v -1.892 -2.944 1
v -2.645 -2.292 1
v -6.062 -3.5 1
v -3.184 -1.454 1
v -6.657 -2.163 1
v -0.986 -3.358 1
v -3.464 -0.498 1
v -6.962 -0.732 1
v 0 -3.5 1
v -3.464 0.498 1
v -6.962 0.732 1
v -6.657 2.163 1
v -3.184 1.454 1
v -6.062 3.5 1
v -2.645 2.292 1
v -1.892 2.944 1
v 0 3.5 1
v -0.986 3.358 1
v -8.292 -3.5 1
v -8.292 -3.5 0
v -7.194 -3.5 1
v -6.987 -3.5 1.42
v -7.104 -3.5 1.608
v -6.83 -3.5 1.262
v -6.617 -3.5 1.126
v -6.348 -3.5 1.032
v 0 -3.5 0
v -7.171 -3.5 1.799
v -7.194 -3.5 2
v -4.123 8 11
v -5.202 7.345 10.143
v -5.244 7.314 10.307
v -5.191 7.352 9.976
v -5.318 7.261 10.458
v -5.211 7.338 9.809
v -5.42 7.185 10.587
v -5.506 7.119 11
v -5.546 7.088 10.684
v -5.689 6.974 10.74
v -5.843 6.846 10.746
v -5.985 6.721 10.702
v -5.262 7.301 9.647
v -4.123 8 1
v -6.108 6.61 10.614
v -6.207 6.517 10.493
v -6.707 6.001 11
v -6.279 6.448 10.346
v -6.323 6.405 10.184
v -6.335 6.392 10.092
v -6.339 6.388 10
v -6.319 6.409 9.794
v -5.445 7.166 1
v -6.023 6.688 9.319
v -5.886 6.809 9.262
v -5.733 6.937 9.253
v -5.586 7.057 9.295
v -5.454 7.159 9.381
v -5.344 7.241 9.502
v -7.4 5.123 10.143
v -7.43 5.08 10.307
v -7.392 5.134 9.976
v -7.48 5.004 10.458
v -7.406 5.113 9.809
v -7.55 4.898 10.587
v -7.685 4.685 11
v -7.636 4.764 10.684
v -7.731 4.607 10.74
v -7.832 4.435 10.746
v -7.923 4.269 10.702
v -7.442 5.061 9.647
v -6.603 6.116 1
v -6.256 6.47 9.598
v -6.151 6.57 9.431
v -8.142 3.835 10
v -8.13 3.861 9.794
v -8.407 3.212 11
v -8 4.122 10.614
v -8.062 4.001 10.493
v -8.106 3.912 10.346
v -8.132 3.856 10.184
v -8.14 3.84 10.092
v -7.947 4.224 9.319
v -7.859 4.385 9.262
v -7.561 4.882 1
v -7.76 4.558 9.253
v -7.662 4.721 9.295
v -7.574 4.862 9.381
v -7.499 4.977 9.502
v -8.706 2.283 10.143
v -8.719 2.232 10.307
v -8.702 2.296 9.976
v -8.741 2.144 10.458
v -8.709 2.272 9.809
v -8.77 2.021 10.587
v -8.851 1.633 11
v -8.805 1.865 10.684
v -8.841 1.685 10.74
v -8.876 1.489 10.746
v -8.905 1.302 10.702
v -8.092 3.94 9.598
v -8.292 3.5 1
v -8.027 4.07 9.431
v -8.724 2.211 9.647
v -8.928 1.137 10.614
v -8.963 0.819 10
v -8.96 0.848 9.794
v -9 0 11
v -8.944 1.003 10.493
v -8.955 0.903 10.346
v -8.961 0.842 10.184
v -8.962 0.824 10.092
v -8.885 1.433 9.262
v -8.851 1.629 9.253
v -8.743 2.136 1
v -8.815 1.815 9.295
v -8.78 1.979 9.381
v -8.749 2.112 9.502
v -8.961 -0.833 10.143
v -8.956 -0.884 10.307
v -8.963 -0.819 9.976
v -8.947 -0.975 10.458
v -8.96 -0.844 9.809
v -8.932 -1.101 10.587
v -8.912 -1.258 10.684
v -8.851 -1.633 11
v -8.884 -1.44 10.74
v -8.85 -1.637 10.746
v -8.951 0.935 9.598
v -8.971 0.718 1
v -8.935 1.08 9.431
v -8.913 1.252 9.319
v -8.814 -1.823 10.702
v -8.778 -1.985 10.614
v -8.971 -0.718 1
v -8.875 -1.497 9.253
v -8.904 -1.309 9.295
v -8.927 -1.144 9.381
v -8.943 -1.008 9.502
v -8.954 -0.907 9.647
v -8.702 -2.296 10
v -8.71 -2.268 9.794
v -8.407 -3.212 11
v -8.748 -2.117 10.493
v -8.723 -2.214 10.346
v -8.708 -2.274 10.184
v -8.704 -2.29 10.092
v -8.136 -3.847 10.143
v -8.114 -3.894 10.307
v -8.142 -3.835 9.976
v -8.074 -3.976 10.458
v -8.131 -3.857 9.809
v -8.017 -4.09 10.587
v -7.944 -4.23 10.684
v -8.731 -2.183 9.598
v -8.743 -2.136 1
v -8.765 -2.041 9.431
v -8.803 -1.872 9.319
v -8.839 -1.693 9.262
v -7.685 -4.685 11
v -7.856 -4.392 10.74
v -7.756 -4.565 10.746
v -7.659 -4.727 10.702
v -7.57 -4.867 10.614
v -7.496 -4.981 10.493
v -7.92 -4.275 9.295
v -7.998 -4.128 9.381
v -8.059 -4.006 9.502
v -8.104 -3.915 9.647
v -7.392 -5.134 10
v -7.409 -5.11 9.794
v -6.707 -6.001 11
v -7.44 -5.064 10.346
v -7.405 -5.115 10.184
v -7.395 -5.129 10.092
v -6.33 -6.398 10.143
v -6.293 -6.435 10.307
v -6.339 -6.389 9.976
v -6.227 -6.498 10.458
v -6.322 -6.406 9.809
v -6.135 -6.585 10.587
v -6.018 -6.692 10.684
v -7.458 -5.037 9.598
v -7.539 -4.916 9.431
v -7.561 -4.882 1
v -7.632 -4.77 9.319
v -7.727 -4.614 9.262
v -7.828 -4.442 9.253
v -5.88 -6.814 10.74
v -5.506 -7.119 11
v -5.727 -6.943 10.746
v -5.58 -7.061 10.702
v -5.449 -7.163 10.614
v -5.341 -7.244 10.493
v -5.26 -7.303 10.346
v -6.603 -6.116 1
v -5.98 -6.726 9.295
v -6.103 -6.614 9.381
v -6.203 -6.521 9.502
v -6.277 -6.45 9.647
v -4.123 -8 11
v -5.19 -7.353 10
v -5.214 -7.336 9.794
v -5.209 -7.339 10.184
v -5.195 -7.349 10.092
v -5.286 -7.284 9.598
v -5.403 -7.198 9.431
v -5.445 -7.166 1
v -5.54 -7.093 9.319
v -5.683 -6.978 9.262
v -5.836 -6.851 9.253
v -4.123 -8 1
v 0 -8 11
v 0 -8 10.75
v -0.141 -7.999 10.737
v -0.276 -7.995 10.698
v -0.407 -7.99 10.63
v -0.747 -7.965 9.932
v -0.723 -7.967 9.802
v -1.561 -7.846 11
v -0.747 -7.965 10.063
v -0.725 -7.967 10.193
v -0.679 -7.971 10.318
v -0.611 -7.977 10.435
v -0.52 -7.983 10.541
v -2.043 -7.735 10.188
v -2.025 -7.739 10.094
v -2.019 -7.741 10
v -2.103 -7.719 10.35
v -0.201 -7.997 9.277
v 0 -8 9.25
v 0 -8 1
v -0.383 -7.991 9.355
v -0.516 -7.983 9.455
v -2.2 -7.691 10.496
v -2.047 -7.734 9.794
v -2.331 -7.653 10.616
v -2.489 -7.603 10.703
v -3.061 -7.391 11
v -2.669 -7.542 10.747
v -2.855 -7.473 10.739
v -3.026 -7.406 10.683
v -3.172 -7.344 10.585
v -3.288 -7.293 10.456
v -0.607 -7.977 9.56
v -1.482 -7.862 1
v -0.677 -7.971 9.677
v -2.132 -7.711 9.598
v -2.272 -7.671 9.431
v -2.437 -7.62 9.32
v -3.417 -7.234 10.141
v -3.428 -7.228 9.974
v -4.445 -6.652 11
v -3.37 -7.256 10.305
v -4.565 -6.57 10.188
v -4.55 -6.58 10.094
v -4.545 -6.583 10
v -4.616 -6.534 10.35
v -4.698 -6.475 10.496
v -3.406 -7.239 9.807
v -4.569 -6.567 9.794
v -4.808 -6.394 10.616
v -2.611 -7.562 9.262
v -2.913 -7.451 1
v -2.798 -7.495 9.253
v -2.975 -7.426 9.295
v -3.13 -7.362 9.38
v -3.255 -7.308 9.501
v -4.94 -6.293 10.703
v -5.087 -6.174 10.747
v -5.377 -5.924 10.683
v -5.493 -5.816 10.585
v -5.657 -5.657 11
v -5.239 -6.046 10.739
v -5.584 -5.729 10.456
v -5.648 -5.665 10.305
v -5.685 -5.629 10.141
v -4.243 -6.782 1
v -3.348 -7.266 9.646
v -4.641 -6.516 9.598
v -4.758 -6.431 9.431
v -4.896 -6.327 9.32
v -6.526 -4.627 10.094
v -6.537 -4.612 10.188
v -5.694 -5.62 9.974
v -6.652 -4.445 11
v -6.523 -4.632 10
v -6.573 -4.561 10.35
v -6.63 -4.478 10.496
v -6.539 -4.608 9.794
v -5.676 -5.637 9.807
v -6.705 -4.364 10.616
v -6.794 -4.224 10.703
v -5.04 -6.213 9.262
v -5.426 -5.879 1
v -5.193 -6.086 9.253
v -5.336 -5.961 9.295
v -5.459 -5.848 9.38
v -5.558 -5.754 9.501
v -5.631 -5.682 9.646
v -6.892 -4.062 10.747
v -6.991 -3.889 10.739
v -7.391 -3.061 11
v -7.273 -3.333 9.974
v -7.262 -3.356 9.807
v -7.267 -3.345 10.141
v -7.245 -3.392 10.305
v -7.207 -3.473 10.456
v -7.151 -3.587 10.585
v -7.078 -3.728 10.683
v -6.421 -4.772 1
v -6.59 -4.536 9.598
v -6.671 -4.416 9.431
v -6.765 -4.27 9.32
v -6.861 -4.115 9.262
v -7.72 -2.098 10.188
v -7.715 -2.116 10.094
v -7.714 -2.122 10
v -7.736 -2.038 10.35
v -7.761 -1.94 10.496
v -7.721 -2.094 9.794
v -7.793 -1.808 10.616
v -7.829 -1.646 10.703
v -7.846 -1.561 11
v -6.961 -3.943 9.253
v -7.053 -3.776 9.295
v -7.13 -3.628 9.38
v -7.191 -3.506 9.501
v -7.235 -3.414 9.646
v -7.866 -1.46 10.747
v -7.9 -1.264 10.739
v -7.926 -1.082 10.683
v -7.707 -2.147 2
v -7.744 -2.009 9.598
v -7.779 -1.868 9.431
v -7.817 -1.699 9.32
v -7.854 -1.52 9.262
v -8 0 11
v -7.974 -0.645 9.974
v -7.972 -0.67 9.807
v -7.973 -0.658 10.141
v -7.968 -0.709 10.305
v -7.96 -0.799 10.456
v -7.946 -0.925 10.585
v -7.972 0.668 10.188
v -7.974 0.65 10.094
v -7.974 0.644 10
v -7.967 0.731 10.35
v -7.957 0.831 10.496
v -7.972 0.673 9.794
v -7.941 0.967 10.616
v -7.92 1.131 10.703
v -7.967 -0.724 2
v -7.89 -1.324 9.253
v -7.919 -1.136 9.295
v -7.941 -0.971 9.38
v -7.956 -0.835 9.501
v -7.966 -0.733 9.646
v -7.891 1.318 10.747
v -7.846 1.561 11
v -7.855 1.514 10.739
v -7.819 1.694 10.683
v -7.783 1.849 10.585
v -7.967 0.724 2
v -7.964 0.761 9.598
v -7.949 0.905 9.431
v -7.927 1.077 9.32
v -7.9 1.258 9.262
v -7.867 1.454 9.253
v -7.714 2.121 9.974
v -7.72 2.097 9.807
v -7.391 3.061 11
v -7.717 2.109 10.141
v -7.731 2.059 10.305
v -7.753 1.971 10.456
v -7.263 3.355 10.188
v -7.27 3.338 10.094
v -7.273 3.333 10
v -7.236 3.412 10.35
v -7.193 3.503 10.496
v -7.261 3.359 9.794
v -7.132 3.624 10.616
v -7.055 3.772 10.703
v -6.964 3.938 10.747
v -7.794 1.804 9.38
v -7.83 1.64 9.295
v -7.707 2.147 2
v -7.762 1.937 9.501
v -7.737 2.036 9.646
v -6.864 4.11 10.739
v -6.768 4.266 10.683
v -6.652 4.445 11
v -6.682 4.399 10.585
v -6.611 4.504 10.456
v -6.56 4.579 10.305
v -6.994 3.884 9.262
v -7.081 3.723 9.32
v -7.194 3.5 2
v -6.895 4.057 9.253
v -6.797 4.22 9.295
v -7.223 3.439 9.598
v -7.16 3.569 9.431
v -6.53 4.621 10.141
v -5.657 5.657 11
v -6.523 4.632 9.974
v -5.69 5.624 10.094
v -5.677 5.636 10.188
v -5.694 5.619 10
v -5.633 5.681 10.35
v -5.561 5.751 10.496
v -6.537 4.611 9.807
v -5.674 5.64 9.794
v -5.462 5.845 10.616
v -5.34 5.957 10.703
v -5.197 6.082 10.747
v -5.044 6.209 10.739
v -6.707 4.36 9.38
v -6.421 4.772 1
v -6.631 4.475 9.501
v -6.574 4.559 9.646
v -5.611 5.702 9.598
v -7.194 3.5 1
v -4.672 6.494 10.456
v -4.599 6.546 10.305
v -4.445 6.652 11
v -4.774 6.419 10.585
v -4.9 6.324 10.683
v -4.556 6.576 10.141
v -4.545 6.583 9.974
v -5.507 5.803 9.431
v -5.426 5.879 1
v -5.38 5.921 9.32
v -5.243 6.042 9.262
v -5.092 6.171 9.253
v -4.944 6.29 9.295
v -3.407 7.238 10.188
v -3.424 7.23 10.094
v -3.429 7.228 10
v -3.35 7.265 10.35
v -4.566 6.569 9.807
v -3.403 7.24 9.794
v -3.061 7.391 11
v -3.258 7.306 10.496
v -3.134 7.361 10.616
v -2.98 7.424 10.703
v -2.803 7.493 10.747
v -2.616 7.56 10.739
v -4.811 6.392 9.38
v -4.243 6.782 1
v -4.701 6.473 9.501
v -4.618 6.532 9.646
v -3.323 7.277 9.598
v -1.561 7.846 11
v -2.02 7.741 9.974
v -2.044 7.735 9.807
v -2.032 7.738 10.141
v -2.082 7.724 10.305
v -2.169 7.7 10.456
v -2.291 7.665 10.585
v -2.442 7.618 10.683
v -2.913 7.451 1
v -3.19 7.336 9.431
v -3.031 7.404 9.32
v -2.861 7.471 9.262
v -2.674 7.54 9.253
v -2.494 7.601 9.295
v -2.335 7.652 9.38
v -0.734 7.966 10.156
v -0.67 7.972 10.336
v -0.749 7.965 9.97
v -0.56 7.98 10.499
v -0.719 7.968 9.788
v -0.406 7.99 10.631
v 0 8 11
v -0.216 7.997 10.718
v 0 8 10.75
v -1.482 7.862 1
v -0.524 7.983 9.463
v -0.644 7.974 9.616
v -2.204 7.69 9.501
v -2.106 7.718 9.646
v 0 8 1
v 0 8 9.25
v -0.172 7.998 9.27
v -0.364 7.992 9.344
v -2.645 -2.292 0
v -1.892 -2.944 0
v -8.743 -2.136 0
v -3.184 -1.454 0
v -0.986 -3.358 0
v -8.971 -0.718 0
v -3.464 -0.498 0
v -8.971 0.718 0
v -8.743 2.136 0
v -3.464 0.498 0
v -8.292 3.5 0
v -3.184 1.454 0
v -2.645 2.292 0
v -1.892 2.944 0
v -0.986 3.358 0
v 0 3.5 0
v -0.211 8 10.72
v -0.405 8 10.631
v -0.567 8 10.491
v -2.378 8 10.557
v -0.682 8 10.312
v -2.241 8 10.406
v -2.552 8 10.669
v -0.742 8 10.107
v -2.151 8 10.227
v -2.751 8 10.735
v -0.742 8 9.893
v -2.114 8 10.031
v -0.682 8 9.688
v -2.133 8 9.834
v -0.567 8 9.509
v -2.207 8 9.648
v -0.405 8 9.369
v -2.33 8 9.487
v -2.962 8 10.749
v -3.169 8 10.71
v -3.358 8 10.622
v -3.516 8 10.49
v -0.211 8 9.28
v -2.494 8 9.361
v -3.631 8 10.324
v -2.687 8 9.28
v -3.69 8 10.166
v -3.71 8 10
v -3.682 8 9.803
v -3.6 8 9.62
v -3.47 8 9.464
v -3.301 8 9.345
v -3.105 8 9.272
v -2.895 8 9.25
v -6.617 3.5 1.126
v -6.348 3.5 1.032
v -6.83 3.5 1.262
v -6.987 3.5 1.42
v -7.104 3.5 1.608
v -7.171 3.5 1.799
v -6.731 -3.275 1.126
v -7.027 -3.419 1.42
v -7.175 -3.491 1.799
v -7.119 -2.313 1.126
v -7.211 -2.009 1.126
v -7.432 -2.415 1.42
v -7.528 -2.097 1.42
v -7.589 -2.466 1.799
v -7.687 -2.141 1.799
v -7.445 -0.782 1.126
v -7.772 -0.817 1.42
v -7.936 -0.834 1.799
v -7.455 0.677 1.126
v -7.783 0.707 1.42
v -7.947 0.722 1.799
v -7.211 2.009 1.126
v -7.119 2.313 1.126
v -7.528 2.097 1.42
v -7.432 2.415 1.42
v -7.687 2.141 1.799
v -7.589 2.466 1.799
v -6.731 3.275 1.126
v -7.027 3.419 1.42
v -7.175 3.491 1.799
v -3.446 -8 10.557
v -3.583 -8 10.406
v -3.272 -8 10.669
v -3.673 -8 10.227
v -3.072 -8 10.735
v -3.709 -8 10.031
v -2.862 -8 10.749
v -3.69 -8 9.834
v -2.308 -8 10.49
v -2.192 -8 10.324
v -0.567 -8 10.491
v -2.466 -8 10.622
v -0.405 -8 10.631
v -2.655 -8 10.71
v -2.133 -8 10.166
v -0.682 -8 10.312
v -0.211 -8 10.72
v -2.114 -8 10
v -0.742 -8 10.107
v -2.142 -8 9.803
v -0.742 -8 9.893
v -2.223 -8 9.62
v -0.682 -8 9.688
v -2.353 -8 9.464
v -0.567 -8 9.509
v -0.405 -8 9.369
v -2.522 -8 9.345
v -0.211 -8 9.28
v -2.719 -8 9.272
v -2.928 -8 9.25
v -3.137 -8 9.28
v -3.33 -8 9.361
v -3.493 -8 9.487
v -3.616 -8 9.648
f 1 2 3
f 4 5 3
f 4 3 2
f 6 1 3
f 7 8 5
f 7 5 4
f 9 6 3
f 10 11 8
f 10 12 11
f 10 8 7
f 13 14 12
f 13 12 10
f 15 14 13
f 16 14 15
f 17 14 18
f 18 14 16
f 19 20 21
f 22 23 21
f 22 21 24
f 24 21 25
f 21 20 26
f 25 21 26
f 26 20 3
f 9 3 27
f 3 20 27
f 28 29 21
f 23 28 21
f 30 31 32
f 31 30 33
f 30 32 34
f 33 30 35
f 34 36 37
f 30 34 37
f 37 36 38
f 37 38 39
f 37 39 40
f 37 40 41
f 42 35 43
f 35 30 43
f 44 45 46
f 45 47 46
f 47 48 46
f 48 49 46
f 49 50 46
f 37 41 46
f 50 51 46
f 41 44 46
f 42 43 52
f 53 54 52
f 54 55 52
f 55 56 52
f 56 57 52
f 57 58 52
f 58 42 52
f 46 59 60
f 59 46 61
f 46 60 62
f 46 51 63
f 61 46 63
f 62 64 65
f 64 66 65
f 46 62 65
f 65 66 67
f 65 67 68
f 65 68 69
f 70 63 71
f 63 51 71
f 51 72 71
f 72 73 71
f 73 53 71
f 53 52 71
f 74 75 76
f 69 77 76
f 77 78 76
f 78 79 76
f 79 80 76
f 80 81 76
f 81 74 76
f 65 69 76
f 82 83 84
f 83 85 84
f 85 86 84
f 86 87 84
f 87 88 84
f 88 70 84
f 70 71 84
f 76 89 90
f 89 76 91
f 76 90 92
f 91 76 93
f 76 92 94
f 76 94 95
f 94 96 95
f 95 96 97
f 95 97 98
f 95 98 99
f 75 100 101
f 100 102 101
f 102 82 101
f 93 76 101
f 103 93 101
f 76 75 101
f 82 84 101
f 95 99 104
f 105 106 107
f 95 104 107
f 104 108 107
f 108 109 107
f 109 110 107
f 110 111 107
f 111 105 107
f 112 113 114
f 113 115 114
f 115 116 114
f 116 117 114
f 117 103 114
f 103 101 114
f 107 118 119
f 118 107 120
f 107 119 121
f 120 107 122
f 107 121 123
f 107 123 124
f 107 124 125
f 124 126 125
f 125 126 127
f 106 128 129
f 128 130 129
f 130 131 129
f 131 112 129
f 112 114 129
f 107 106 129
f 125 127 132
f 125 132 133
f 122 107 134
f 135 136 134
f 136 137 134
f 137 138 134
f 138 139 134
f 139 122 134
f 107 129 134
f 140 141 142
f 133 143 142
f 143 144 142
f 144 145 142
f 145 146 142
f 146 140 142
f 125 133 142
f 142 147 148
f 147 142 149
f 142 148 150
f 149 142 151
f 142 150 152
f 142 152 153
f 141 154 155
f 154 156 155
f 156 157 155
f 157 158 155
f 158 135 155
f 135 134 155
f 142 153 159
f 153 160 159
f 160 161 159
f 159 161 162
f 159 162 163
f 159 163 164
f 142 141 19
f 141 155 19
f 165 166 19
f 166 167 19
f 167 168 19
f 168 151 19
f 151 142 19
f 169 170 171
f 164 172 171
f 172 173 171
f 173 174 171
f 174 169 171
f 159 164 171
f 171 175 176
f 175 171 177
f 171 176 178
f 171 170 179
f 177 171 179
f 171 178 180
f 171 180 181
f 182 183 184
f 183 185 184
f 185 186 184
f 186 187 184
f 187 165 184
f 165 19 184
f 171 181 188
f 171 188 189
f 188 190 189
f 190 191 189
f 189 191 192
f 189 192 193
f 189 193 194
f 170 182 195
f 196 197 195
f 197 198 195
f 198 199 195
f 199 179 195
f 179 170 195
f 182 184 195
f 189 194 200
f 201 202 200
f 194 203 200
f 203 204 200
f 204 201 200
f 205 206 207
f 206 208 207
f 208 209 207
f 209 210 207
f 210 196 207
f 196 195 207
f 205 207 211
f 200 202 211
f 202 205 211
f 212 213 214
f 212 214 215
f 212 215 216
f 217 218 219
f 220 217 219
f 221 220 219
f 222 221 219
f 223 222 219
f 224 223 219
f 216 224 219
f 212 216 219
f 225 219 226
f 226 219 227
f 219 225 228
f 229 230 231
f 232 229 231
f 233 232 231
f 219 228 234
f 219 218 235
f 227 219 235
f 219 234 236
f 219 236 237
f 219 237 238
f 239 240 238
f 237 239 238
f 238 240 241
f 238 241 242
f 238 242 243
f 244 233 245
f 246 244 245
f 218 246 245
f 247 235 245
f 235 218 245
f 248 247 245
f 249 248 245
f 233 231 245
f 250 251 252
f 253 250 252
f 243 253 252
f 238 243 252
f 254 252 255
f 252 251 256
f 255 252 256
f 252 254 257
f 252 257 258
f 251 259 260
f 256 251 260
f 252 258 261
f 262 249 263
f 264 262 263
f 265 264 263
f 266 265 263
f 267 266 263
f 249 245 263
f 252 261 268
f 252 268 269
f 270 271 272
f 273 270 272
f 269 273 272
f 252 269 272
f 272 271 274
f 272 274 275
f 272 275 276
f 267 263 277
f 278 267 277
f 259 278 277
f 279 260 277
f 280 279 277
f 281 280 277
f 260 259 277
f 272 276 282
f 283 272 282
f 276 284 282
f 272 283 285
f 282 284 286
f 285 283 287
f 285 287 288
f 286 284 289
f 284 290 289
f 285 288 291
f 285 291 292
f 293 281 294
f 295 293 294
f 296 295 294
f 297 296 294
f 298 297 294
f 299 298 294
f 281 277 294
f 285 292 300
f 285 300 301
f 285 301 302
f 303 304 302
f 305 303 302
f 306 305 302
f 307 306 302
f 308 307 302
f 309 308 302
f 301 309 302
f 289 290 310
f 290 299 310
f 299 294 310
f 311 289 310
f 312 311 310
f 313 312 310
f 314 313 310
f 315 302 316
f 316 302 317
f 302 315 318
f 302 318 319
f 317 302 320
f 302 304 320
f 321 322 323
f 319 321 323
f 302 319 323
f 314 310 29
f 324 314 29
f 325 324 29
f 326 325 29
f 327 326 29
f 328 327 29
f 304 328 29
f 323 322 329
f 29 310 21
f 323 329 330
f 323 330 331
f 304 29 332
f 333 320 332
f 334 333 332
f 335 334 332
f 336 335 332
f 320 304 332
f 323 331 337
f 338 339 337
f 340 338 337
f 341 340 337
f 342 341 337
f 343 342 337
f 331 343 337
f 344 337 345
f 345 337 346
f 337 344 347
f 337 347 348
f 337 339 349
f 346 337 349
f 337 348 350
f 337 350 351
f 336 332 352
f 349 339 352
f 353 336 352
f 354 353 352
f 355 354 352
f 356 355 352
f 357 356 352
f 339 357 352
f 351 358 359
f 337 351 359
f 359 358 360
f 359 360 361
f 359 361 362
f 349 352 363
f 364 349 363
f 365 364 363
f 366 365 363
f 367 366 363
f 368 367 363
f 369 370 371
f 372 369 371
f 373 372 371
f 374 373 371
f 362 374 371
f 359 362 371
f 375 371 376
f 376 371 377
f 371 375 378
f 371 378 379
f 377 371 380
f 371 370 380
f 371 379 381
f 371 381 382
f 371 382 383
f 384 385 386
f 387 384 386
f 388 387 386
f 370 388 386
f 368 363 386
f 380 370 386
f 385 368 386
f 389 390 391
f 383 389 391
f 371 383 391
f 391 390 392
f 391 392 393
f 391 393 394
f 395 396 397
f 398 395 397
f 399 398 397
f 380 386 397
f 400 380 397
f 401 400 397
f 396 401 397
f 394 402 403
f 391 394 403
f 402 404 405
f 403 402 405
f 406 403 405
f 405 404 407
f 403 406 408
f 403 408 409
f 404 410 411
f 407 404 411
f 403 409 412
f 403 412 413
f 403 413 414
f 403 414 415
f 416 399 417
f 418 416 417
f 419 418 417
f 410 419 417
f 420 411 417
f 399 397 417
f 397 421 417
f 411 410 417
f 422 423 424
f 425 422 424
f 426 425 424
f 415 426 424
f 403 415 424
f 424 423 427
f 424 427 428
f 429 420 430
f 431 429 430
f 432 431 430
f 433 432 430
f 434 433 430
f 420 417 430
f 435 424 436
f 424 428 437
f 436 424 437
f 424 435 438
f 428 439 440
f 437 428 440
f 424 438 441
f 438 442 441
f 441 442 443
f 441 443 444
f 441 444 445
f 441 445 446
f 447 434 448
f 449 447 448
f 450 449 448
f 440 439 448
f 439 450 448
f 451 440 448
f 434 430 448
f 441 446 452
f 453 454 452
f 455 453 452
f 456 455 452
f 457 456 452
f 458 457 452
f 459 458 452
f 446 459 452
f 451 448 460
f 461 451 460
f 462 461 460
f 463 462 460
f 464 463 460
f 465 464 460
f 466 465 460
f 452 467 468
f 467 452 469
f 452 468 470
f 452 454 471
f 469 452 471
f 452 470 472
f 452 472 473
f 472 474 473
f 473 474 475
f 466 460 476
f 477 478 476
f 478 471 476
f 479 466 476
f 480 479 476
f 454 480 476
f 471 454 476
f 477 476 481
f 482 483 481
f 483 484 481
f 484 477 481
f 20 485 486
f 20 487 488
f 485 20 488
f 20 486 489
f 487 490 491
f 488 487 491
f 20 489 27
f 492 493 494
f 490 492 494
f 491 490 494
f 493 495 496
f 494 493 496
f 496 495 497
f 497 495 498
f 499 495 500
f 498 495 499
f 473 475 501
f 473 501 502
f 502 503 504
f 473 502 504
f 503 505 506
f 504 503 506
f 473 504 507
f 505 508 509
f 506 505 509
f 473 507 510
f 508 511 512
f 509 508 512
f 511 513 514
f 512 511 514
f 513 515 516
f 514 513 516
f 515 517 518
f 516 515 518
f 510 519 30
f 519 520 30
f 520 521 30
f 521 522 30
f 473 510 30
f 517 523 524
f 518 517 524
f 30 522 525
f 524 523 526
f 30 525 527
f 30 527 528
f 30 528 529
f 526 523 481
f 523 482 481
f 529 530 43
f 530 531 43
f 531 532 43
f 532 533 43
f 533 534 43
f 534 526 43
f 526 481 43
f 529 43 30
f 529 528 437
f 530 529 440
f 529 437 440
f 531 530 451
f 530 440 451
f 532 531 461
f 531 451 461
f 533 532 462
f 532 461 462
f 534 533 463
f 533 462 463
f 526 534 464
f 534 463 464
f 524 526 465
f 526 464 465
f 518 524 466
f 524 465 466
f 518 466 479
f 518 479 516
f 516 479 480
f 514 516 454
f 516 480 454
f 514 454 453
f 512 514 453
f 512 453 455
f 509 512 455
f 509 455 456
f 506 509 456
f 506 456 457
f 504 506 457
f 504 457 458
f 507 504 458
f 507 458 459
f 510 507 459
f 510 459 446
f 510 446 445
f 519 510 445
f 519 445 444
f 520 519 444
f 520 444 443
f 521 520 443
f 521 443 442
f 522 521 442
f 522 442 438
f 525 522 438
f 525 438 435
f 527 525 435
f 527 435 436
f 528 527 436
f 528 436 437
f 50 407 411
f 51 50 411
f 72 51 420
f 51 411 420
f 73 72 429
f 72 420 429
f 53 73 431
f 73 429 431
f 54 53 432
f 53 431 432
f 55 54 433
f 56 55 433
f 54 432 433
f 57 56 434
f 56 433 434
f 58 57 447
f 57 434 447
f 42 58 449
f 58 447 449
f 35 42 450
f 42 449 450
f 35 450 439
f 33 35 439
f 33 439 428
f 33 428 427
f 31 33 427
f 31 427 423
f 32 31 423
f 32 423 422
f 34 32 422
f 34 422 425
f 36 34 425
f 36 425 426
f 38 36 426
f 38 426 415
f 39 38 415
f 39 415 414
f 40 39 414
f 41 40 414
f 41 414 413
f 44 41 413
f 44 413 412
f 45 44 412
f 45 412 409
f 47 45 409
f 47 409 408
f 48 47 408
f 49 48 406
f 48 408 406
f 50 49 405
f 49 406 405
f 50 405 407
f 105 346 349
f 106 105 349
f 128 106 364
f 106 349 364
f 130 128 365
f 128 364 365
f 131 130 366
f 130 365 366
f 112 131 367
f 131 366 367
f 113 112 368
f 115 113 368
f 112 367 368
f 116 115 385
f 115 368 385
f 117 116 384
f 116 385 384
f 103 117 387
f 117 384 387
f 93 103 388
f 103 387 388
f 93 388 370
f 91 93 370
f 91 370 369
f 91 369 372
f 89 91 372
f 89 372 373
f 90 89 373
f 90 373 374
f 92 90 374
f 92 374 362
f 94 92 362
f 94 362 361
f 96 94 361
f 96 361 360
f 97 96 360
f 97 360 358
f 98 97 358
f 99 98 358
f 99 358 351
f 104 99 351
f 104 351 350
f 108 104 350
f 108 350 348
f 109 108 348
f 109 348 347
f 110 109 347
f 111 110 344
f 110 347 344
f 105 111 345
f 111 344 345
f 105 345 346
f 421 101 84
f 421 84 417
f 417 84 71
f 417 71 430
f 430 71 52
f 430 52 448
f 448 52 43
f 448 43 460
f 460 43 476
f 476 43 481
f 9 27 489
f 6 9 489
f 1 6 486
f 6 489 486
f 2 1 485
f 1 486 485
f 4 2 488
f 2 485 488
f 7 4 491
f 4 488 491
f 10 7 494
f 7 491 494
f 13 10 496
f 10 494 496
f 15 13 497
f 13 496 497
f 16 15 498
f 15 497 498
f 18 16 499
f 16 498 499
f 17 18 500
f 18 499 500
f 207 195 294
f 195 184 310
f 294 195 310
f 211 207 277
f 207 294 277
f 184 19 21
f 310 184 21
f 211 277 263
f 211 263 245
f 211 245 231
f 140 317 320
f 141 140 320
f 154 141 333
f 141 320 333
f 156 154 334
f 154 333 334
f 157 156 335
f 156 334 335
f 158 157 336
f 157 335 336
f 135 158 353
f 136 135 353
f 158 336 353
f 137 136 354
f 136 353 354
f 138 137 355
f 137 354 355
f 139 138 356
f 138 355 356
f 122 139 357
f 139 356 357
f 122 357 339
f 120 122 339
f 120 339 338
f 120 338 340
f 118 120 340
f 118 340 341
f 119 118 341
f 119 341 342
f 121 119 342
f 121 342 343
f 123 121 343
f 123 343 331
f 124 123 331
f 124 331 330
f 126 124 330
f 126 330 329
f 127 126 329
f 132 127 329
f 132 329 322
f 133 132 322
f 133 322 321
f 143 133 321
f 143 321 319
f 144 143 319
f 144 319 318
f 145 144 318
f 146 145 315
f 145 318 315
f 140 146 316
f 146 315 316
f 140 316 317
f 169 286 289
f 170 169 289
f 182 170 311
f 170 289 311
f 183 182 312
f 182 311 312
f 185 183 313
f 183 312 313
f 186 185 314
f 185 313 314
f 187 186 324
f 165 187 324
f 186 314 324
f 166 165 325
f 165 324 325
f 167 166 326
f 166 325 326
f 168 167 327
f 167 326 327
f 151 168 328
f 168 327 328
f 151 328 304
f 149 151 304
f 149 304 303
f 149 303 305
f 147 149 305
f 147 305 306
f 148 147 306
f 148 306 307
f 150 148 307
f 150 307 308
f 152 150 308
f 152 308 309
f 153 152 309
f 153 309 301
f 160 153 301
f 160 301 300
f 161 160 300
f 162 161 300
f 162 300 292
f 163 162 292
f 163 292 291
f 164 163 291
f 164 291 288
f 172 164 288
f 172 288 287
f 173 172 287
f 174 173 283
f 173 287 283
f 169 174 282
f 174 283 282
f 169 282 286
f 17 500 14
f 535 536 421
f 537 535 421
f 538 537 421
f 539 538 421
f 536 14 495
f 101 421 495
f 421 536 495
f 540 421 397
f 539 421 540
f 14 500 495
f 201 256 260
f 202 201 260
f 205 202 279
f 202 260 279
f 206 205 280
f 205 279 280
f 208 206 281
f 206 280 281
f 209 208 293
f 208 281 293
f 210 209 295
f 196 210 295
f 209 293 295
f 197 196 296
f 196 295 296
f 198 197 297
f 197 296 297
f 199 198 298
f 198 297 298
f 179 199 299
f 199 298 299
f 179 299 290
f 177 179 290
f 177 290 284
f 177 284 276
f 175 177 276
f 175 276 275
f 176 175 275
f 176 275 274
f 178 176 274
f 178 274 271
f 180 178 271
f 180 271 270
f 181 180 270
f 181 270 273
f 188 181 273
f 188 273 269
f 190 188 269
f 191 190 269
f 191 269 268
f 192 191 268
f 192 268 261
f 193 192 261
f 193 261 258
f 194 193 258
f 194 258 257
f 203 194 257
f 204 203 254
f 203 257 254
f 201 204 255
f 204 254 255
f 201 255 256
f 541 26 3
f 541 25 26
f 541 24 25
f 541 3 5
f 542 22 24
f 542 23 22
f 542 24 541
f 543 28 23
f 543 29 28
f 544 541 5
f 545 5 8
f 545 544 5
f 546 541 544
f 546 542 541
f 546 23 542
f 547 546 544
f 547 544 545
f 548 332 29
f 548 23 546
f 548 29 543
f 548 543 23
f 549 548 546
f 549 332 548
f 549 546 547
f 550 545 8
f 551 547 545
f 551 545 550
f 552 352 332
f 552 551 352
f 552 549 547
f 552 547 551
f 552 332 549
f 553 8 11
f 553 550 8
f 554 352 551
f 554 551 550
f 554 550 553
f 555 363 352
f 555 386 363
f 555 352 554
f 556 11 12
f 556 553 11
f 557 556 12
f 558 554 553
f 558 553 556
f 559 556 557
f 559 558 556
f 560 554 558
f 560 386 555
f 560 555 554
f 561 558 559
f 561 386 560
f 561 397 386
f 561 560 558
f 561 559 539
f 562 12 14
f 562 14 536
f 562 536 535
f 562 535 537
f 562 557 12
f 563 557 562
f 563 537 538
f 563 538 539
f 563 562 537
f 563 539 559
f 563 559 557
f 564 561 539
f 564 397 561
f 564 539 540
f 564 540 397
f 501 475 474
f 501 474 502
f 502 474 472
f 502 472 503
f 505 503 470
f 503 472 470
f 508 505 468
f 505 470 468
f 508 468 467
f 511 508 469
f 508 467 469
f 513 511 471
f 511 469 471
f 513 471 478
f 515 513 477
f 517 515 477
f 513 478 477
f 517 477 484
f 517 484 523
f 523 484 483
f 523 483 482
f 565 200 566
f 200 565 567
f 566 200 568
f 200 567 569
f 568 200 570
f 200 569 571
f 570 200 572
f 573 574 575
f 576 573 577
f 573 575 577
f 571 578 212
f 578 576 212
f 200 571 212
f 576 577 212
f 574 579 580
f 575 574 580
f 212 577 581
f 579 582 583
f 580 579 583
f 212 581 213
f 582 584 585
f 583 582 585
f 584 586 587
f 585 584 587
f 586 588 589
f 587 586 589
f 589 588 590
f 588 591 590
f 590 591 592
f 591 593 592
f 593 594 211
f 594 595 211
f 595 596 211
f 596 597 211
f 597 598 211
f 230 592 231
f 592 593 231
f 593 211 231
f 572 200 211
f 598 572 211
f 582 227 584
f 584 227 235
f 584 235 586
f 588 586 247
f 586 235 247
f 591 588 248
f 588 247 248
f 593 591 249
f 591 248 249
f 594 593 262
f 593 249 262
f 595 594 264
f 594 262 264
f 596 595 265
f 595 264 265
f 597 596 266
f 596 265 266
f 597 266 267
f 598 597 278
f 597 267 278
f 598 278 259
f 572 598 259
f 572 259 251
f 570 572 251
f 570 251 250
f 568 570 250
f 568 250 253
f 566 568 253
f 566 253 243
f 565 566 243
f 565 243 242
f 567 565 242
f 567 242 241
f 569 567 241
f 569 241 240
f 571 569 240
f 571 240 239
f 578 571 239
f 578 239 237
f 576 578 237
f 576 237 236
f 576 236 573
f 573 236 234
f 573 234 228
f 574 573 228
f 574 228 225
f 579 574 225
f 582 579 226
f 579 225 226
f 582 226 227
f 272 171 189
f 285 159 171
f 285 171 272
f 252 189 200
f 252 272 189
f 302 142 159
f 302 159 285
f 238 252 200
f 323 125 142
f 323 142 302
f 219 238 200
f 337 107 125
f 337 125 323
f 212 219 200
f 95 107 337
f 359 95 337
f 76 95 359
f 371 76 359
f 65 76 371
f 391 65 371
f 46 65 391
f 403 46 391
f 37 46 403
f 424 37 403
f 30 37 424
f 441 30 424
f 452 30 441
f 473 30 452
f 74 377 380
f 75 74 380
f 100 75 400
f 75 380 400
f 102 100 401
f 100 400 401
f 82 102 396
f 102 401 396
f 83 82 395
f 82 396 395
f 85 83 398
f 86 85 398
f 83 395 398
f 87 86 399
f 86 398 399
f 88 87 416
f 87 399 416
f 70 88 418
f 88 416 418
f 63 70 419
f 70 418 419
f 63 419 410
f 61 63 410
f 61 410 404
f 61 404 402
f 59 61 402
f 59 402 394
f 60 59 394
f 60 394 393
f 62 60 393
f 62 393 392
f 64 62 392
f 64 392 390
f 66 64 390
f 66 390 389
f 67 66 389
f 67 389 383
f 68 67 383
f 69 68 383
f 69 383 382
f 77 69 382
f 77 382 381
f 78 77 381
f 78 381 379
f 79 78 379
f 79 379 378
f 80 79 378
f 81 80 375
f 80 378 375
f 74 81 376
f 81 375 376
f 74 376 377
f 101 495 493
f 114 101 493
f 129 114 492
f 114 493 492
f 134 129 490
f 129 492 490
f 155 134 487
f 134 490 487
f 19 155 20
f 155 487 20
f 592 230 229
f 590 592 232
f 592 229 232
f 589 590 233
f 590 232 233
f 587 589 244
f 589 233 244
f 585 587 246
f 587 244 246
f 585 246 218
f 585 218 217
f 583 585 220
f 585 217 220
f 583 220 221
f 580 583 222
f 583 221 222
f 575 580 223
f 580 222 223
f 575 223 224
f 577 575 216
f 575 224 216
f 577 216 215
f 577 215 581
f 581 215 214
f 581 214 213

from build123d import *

# Parameters (mm, degrees)
EXTRUDE_1_DEPTH          = 1
EXTRUDE_2_DEPTH          = 10
SKETCH_3_R               = 0.75
CUT_EXTRUDE_1_DEPTH      = 10
PATTERN_CIRCULAR_1_COUNT = 18
FILLET_1_R               = 1


with BuildPart() as part:
    # Эскиз1 → Бобышка-Вытянуть1 (new body)
    with BuildSketch(Plane.XY):
        with BuildLine():
            Line((0, 3.5), (-8.291561976, 3.5))
            ThreePointArc((-8.291561976, 3.5), (-9, 0), (-8.291561976, -3.5))
            Line((-8.291561976, -3.5), (0, -3.5))
            ThreePointArc((0, -3.5), (-3.5, 0), (0, 3.5))
        make_face()
    extrude(amount=EXTRUDE_1_DEPTH)

    # Эскиз2 → Бобышка-Вытянуть2 (add)
    with BuildSketch(Plane.XY.offset(1)):
        with BuildLine():
            Line((5.61e-07, 8), (-4.123105626, 8))
            ThreePointArc((-4.123105626, 8), (-9, 0), (-4.123105626, -8))
            Line((-4.123105626, -8), (2.99e-07, -8))
            ThreePointArc((2.99e-07, -8), (-8, 1.31e-07), (5.61e-07, 8))
        make_face()
    extrude(amount=EXTRUDE_2_DEPTH)

    # Эскиз3 → Вырез-Вытянуть1 (cut)
    with BuildSketch(Plane(origin=(0, 0, 0), x_dir=(1, 0, 0), z_dir=(0, 1, 0))):
        with Locations((0, -10)):
            Circle(SKETCH_3_R)
    cut_extrude_1 = extrude(amount=-CUT_EXTRUDE_1_DEPTH, mode=Mode.SUBTRACT)

    # Круговой массив1: Вырез-Вытянуть1 ×18 about axis
    pattern_circular_1_axis = Axis((0, 0, 0), (0, 0, -1))
    for i in range(1, PATTERN_CIRCULAR_1_COUNT):
        add(cut_extrude_1.rotate(pattern_circular_1_axis, i * 360 / PATTERN_CIRCULAR_1_COUNT), mode=Mode.SUBTRACT)

    # Скругление1
    fillet_1_edges = [part.edges().sort_by_distance(p)[0] for p in [
        (-8, 0, 1),
    ]]
    fillet(fillet_1_edges, radius=FILLET_1_R)


solid = part.part
